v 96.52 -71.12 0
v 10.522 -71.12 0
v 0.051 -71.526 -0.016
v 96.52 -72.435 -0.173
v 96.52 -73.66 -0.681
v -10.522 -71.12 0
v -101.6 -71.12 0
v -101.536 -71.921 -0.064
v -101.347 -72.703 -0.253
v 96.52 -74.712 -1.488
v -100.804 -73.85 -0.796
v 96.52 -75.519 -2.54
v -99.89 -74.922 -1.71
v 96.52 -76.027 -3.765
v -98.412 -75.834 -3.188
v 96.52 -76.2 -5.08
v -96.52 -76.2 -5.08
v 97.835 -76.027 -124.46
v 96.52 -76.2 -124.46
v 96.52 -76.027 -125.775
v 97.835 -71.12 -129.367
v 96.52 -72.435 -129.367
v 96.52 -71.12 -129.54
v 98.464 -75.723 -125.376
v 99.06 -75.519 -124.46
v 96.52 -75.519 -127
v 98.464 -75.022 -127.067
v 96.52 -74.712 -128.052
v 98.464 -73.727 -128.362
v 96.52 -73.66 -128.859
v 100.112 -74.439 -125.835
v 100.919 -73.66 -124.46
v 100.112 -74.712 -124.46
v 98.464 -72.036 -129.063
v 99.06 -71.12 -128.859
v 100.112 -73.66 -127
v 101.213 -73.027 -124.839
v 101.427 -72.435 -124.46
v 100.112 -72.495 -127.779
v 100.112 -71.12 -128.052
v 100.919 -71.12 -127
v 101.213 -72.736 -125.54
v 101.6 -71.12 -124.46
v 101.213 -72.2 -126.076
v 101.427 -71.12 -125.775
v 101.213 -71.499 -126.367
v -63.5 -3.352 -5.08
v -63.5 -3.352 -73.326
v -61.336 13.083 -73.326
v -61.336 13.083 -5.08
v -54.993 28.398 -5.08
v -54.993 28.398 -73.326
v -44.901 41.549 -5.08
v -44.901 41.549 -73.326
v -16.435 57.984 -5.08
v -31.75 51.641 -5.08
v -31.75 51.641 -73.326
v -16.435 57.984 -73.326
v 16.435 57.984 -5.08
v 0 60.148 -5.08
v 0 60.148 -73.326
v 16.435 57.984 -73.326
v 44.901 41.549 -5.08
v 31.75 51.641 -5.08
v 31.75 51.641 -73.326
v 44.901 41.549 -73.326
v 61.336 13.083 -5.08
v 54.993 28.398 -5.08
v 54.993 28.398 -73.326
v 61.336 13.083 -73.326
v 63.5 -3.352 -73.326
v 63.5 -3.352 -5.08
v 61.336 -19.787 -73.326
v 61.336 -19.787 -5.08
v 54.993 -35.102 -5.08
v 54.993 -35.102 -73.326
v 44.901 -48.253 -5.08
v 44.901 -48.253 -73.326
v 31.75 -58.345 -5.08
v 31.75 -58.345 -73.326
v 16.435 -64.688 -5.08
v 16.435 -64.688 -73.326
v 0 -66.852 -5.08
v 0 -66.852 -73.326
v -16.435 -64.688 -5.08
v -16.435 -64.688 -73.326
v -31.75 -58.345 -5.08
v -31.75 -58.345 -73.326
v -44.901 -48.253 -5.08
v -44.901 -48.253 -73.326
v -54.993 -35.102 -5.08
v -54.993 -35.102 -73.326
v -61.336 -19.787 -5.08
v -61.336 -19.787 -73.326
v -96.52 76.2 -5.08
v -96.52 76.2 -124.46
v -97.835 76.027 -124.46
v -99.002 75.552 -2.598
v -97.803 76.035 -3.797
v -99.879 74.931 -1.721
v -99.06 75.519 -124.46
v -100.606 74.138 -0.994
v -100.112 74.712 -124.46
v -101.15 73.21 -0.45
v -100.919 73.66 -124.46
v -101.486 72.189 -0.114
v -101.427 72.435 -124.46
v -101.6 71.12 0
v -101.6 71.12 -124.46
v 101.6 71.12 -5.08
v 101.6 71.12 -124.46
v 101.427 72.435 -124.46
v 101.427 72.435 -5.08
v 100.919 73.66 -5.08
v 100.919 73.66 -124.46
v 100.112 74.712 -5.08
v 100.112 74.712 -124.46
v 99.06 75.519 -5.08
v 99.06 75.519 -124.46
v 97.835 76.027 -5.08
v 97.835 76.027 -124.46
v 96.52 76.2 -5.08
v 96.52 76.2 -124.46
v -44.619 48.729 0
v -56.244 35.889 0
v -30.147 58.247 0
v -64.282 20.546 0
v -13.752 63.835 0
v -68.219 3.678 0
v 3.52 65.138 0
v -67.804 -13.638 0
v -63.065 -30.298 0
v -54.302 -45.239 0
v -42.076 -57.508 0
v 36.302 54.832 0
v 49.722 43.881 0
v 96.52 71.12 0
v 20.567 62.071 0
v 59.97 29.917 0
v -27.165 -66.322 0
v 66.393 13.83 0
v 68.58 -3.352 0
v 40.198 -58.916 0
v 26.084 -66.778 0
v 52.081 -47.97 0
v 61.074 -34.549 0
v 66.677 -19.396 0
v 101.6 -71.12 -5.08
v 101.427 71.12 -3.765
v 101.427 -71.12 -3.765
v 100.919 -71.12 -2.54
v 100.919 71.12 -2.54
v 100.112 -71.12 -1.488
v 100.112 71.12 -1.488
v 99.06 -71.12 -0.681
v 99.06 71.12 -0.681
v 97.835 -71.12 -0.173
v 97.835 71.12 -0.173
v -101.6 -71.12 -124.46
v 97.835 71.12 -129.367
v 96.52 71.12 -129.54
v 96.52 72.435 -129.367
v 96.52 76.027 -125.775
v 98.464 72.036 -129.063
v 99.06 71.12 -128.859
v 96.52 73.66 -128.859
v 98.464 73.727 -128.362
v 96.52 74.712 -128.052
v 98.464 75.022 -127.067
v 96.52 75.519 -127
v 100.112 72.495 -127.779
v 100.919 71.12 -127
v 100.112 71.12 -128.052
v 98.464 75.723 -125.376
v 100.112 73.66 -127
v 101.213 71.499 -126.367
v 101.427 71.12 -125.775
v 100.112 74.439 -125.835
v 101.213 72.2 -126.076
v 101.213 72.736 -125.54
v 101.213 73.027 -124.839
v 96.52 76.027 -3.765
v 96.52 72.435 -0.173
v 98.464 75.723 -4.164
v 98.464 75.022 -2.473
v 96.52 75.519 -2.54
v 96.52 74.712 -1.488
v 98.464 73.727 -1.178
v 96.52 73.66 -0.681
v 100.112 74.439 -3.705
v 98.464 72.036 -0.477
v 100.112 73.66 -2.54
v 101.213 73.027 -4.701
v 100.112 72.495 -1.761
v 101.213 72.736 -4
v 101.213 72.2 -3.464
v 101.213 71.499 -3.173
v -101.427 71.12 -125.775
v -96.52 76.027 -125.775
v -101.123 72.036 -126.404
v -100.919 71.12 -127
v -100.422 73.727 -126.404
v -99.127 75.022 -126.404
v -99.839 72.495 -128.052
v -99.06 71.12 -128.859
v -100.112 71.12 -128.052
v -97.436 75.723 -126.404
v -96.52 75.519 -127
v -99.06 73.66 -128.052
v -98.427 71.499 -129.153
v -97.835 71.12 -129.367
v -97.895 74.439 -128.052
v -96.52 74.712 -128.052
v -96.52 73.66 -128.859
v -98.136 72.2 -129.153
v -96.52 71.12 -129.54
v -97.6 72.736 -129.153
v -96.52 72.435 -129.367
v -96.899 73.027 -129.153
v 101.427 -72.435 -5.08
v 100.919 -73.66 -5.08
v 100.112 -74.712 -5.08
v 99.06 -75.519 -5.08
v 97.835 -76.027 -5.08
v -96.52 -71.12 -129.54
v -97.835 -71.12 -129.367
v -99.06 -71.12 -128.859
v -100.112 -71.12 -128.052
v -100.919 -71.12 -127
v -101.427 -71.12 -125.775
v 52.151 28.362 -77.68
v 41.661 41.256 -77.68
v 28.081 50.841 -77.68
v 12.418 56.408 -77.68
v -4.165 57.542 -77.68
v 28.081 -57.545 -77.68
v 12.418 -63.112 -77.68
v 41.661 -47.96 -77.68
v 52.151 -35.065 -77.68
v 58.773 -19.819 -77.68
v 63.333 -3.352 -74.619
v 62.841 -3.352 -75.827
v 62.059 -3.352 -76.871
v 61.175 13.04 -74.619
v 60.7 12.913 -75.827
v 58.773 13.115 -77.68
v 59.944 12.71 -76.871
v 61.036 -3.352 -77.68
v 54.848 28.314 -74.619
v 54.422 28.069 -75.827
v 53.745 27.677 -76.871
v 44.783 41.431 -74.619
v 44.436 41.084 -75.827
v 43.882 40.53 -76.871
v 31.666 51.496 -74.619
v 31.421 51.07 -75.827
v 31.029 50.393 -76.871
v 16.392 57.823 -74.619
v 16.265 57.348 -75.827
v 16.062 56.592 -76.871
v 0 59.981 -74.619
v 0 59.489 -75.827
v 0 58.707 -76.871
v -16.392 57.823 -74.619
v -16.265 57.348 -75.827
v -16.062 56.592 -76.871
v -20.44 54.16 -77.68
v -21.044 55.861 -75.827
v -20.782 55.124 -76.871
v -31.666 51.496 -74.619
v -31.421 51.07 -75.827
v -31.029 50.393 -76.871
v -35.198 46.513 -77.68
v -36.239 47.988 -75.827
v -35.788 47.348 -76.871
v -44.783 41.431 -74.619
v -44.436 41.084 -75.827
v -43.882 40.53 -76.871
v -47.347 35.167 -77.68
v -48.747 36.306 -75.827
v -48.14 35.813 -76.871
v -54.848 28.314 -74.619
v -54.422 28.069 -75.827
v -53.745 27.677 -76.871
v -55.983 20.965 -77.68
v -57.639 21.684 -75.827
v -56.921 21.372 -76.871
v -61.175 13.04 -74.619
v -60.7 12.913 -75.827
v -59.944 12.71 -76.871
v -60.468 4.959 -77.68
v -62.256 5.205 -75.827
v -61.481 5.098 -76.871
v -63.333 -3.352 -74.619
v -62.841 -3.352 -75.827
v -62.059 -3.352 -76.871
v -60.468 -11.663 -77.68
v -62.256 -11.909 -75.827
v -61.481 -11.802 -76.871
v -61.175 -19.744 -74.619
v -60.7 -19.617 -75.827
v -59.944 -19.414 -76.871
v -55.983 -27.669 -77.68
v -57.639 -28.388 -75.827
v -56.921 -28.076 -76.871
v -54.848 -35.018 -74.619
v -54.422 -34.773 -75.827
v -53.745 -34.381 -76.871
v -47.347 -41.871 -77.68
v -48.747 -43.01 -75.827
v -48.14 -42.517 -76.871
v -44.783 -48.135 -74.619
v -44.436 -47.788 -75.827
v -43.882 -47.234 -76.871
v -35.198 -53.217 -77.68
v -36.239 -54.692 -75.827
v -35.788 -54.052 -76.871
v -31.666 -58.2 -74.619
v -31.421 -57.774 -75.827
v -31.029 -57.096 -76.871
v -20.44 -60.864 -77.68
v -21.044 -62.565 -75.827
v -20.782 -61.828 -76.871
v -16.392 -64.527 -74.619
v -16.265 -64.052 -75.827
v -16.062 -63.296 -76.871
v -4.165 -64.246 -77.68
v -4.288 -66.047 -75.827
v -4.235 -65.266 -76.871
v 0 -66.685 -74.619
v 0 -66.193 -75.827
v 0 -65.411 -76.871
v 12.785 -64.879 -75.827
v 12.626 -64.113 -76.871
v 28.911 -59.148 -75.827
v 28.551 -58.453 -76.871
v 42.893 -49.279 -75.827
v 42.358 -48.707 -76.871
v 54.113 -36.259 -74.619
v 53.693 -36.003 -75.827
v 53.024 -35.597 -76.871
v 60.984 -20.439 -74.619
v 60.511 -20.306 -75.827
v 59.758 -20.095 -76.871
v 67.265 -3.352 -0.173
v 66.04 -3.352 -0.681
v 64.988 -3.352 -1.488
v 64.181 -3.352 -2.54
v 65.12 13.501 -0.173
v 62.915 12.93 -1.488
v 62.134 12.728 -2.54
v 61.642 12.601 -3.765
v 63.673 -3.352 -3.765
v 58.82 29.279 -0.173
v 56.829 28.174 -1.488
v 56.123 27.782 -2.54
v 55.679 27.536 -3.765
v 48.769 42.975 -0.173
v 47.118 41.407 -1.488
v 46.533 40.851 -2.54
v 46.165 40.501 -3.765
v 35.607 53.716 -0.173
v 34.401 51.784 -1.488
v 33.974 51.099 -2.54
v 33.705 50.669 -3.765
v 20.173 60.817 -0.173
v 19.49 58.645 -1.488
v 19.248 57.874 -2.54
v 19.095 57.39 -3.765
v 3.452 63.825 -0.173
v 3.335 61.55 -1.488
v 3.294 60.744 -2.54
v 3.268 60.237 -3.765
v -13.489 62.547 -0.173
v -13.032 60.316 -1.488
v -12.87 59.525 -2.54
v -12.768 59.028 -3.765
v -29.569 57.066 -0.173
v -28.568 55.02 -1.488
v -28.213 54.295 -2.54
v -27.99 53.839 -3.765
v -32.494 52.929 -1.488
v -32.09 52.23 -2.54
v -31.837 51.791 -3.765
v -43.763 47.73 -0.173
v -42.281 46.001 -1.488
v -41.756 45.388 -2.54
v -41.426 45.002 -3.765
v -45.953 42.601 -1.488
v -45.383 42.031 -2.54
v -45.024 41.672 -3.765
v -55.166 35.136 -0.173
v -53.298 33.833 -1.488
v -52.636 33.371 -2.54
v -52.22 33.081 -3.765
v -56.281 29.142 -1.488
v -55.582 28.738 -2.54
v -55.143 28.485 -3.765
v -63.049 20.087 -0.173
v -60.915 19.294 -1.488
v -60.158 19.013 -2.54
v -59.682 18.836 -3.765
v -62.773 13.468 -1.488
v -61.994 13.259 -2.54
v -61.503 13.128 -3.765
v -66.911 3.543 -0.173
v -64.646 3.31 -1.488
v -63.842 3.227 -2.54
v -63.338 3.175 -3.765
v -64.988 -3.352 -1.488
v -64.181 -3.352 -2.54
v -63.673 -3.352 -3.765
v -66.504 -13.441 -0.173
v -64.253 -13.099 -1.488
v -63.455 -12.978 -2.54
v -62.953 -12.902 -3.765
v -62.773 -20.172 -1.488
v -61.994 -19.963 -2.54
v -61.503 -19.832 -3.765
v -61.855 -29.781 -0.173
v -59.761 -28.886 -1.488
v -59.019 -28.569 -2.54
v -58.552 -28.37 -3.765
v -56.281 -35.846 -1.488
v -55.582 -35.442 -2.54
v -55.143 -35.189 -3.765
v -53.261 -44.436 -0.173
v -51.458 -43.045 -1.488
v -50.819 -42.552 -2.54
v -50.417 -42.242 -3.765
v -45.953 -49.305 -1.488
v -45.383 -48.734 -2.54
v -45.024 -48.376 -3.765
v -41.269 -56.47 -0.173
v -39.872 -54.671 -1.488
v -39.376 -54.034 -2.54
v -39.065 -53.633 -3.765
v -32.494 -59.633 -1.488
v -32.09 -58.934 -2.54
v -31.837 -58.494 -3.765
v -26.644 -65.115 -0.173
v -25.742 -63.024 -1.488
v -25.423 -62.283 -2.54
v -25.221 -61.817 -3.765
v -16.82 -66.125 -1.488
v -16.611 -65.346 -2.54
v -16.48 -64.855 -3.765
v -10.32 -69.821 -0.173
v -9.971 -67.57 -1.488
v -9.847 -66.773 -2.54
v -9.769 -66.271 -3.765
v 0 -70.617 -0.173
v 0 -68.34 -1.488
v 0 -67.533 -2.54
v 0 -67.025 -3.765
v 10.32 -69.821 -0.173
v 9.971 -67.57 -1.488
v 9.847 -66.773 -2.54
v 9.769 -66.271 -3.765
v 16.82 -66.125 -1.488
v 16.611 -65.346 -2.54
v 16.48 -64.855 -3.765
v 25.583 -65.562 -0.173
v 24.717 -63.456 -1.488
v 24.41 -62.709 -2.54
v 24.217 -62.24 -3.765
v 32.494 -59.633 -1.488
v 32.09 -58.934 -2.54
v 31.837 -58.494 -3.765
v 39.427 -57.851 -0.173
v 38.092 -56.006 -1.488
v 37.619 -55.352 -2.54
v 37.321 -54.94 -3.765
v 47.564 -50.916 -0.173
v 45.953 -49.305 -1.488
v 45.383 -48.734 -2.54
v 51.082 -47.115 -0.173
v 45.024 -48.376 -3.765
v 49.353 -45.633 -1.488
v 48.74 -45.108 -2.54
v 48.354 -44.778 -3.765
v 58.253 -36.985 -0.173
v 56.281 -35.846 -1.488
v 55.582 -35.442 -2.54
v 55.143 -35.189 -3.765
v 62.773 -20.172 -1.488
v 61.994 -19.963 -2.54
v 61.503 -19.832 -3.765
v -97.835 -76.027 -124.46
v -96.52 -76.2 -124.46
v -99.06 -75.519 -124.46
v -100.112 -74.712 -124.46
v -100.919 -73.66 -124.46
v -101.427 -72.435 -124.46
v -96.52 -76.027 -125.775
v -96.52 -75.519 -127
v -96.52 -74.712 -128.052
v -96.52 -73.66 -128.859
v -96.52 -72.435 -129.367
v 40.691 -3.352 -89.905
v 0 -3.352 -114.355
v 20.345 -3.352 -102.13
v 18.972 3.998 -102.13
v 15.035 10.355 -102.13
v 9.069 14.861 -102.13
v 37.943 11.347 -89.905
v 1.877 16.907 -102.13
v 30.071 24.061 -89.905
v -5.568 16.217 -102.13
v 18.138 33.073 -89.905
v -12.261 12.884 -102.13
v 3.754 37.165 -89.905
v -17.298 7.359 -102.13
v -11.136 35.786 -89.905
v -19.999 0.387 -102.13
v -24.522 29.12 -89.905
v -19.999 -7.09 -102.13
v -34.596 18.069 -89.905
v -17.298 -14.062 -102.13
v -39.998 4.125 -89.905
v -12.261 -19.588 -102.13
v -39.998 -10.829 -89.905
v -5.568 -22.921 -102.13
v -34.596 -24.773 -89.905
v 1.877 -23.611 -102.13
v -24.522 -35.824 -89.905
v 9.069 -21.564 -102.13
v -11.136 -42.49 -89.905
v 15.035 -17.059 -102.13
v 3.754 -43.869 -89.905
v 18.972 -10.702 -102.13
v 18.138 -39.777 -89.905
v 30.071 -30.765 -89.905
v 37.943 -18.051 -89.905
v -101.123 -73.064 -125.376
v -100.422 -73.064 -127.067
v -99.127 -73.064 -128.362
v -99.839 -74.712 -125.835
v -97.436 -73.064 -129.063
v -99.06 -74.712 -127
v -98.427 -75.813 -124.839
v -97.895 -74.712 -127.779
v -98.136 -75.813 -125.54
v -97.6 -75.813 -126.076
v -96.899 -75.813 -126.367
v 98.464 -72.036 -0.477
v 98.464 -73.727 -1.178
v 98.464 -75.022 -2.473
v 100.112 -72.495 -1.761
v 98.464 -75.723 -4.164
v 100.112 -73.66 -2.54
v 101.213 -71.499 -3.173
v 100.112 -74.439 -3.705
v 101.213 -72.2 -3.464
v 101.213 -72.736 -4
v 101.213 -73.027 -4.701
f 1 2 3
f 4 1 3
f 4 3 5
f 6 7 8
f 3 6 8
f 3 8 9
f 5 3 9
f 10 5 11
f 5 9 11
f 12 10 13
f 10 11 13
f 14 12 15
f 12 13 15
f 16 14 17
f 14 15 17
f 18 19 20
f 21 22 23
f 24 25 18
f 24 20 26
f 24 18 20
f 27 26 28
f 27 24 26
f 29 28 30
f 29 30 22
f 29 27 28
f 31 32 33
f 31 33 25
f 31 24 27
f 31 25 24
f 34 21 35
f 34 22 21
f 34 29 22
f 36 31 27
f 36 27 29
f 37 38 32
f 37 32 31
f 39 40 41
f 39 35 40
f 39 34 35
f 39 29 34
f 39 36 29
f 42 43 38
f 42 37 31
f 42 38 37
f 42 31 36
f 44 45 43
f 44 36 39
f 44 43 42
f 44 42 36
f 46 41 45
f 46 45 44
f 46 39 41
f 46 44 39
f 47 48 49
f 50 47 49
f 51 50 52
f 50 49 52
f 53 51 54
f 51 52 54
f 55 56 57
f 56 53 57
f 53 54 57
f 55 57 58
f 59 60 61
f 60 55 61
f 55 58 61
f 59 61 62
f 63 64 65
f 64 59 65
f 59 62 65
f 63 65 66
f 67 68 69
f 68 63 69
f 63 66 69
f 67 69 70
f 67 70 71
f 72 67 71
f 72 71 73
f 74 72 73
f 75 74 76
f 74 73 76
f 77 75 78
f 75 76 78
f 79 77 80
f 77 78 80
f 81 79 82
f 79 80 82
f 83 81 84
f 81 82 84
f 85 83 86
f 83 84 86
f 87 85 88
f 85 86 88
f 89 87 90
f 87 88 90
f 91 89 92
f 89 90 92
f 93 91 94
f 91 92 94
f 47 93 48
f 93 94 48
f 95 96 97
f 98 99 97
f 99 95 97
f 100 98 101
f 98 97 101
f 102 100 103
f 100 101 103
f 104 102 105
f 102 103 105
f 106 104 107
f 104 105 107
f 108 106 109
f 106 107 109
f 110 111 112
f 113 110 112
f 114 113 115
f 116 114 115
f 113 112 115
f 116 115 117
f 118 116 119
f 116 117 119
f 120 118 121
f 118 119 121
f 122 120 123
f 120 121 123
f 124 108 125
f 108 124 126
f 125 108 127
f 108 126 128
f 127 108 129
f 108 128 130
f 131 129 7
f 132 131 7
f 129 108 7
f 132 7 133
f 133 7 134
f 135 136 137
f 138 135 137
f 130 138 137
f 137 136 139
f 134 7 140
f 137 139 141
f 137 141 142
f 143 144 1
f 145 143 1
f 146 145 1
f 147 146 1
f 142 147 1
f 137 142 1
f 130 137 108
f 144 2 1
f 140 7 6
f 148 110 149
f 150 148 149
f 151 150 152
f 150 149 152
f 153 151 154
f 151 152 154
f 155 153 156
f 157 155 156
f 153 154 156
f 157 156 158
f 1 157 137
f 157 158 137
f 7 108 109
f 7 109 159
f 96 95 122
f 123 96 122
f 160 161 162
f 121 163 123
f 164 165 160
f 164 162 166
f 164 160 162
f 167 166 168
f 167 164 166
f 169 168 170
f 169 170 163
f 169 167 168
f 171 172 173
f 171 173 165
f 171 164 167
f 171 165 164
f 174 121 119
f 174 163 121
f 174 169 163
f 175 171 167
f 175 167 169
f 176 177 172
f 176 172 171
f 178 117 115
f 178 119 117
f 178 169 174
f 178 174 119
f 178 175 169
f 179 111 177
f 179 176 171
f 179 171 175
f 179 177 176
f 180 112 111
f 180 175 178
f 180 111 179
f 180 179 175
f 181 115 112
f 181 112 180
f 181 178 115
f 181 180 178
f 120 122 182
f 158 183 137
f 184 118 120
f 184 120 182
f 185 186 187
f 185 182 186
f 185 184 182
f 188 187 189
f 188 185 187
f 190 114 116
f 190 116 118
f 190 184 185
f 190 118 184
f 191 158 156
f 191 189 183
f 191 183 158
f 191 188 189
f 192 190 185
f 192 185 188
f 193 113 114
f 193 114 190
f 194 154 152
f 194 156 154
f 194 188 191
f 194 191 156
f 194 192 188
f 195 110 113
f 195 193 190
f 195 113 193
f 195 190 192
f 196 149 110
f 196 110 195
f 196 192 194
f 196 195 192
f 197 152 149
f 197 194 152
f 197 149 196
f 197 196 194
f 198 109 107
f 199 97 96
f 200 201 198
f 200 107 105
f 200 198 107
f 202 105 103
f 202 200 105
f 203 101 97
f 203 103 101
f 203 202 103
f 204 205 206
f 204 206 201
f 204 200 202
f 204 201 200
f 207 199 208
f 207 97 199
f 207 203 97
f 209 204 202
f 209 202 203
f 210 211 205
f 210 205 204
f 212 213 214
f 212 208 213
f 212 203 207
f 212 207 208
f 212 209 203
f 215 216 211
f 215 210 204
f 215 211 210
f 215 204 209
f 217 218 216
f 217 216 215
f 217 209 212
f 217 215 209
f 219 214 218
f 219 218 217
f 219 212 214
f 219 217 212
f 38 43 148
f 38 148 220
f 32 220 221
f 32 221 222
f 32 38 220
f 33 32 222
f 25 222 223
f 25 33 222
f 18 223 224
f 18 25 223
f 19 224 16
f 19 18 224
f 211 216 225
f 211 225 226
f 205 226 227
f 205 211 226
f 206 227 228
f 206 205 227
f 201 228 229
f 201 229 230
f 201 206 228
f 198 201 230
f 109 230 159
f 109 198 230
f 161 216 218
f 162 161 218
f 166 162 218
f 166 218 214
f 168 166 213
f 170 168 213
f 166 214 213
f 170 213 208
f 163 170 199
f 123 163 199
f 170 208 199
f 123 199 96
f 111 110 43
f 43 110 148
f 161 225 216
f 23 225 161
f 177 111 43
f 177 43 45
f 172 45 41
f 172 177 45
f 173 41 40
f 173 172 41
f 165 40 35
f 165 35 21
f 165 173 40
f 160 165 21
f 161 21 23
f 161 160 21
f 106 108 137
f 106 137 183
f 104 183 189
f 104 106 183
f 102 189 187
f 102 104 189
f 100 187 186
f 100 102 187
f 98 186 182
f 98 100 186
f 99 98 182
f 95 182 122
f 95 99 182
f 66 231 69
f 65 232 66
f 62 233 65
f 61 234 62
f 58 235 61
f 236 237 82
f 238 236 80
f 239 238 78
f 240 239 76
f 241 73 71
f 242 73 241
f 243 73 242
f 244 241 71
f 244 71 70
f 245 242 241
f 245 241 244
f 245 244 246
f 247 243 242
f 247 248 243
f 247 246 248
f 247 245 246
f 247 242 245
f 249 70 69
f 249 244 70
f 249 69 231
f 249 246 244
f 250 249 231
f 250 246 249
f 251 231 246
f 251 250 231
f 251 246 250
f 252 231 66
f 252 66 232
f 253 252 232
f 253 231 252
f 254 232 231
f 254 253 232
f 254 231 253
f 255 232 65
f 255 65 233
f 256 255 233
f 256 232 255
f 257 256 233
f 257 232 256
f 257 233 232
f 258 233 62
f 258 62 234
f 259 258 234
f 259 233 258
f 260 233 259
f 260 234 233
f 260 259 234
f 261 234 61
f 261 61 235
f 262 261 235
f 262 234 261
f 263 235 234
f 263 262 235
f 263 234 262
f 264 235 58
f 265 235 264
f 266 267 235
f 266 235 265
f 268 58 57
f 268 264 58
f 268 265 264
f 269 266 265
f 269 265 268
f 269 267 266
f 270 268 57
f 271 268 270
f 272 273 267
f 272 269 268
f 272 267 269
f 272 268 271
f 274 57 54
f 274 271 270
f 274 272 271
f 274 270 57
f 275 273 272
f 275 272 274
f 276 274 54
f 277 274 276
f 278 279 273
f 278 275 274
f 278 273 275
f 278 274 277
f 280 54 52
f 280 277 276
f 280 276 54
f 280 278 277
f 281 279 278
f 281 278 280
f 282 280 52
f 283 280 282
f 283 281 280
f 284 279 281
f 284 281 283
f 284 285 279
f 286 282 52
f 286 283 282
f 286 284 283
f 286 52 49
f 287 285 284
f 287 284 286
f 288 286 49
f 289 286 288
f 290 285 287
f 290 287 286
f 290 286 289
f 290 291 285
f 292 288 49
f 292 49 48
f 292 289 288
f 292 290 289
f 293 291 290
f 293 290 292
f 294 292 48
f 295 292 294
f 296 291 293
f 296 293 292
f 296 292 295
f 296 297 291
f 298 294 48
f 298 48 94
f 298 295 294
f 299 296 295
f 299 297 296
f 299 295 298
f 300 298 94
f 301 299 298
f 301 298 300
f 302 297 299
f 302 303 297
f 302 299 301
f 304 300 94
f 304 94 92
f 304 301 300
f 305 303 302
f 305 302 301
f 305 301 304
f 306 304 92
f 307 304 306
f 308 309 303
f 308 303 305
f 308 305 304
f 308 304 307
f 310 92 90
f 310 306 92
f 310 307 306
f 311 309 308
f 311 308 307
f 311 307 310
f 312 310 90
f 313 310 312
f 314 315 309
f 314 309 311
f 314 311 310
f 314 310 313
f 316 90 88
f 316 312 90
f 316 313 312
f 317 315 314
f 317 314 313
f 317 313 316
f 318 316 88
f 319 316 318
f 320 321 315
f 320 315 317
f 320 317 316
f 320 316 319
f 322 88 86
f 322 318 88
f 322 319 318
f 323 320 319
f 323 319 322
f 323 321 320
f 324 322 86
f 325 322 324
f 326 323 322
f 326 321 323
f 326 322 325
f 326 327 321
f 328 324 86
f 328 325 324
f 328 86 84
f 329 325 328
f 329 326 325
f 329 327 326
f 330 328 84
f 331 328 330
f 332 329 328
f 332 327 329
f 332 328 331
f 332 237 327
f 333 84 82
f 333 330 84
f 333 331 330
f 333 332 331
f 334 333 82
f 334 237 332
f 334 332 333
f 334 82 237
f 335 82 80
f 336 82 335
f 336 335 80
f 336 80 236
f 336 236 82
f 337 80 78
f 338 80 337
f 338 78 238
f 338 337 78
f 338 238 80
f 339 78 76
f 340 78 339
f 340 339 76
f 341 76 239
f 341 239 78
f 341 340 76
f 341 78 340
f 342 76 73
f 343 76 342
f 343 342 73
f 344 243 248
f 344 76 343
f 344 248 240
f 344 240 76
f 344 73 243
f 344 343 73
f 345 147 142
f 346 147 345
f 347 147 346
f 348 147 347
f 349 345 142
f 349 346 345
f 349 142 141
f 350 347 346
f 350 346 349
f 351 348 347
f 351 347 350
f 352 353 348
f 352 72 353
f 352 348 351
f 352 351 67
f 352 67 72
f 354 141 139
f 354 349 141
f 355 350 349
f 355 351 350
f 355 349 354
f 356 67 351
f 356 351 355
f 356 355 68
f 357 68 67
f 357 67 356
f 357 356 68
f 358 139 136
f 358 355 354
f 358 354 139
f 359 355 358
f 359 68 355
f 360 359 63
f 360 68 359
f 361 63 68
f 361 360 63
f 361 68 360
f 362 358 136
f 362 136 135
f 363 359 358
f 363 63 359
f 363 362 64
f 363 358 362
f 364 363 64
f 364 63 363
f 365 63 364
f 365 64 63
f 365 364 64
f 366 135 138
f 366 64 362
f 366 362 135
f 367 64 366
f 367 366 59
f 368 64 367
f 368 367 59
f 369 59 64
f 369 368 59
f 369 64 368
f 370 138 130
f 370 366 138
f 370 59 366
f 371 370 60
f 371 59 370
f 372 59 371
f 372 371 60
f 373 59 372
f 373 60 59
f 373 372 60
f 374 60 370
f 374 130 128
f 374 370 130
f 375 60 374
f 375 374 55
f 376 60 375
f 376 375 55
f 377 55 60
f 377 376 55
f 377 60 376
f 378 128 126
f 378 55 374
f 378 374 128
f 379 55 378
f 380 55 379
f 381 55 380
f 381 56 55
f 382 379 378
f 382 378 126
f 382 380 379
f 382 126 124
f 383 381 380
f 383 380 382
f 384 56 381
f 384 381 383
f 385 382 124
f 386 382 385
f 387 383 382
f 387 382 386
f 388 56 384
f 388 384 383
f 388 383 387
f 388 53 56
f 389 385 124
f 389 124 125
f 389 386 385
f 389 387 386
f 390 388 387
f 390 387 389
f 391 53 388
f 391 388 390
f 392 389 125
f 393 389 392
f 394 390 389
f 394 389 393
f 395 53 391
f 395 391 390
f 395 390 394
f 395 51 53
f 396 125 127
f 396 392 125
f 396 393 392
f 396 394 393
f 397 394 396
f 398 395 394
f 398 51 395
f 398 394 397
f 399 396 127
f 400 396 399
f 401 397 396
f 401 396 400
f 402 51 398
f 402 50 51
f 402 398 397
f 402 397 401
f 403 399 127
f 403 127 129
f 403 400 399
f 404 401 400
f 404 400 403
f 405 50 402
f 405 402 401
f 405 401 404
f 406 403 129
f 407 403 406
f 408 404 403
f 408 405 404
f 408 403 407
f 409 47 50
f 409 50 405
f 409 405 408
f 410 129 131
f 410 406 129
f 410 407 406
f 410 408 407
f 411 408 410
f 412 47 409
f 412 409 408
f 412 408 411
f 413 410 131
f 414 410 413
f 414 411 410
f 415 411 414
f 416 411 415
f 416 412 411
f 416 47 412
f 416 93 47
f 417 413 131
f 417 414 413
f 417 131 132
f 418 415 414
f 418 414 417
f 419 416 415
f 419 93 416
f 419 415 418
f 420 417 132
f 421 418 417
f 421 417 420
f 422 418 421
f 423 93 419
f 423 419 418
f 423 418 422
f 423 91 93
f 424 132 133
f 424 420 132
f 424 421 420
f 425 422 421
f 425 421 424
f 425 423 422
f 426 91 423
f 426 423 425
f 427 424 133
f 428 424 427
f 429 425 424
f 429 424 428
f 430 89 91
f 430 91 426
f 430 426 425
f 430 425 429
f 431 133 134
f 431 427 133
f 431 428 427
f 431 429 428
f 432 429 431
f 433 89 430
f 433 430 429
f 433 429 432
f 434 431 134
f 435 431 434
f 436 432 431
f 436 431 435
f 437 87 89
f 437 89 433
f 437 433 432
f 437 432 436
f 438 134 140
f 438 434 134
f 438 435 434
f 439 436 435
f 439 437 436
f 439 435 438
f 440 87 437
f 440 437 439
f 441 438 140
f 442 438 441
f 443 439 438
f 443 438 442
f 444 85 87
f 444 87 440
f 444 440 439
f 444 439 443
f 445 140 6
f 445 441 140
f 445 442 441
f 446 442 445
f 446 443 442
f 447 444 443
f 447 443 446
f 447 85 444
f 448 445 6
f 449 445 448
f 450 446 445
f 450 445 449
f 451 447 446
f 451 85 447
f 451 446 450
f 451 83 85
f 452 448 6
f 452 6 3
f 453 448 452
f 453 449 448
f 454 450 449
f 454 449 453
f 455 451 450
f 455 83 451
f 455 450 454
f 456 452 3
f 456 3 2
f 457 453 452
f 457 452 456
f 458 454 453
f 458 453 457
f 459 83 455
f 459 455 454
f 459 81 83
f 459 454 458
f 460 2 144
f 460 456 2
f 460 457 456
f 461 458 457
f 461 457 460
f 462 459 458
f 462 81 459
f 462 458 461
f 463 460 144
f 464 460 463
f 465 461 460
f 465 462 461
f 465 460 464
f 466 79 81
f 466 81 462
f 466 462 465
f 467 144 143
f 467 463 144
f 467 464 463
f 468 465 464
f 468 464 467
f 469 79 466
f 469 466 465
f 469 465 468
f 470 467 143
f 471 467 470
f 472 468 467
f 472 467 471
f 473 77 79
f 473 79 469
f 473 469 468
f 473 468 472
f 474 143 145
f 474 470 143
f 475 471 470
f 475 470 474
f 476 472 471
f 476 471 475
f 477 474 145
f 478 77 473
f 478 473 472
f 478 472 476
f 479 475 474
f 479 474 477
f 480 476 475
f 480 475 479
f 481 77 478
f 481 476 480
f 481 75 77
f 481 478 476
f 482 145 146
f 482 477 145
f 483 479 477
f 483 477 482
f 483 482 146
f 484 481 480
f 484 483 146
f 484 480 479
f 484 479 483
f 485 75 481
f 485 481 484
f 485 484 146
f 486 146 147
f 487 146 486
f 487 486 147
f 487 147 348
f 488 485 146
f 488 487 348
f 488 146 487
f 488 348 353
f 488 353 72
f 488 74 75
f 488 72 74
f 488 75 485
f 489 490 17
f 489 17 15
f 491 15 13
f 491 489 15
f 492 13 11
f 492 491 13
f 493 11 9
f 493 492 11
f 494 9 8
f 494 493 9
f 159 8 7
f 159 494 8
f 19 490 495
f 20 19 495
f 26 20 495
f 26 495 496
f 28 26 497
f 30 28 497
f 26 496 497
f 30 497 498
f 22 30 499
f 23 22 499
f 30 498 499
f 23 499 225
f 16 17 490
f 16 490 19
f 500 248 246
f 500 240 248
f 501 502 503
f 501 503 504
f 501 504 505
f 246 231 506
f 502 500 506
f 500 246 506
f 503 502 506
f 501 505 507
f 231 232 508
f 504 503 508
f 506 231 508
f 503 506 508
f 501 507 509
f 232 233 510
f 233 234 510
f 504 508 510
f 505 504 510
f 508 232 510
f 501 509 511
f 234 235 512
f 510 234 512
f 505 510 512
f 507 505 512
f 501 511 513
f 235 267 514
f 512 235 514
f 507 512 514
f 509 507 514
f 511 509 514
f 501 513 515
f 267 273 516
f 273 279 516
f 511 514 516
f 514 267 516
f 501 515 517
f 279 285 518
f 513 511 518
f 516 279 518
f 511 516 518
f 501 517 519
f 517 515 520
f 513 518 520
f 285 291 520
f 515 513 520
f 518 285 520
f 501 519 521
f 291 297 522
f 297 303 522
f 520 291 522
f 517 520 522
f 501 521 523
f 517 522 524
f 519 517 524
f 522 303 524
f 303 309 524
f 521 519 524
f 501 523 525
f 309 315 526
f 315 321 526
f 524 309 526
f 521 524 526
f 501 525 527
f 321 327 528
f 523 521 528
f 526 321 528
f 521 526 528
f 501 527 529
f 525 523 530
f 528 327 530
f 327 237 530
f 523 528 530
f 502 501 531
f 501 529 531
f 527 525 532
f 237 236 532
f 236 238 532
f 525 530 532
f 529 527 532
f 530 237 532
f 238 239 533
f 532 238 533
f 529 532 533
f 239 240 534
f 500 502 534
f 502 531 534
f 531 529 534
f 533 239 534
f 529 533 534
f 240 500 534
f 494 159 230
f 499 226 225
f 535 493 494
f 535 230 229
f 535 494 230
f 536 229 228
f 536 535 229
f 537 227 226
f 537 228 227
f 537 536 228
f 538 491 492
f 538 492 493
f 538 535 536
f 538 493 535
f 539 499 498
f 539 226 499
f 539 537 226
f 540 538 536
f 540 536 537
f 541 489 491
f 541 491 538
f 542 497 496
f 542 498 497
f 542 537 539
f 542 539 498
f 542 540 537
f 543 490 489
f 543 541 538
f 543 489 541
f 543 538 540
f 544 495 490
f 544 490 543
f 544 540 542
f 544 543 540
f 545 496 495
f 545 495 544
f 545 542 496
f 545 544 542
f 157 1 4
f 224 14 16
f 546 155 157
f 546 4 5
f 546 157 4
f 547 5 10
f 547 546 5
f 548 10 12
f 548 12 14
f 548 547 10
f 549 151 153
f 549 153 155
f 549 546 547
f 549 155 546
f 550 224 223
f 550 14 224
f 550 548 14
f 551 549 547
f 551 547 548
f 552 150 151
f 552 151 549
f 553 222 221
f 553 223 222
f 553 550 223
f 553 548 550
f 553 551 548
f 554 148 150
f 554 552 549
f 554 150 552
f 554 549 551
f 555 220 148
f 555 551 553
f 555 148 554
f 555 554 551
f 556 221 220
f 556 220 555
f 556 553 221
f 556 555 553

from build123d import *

# Parameters (mm, degrees)
F1_W         = 203.2
F1_H         = 127
F2_DEPTH     = 76.2
F3_D         = 127
F3_DEPTH     = 76.2
F3_TIP       = 38.1546493083
F4_DEPTH     = 2.54
F5_T3_DEPTH  = 210.82
F5_T5_DEPTH  = 142.24
F5_T7_DEPTH  = 193.04
F5_T9_DEPTH  = 137.16
F5_T11_DEPTH = 119.38
F5_S15_W     = 5.08
F5_S15_H     = 5.08
F5_T16_DEPTH = 5.08
F5_S21_W     = 5.08
F5_S21_H     = 5.08
F5_T22_DEPTH = 5.08
F5_S27_W     = 5.08
F5_S27_H     = 5.08
F5_T28_DEPTH = 5.08
F5_S33_W     = 5.08
F5_S33_H     = 5.08
F5_T34_DEPTH = 5.08
F5_S39_W     = 5.08
F5_S39_H     = 5.08
F5_T40_DEPTH = 5.08
F5_S45_W     = 5.08
F5_S45_H     = 5.08
F5_T46_DEPTH = 5.08


# Not quite as in the source:
# - a fillet or chamfer that OpenCascade refuses, or shapes differently, is made with other operations: its cross-section is extruded or revolved along the edge and cut away or added


with BuildPart() as f2:
    # F1 (on Front) → F2 (new body, symmetric)
    with BuildSketch(Plane.XZ):
        with Locations((0, -63.5)):
            Rectangle(F1_W, F1_H)
    extrude(amount=F2_DEPTH, both=True)

    # F3
    with Locations(Plane.XY):
        with Locations((0, -3.3519673161)):
            Hole(F3_D / 2, depth=F3_DEPTH)
            with Locations((0, 0, -(F3_DEPTH + F3_TIP / 2))):  # 118° drill point
                Cone(0, F3_D / 2, F3_TIP, mode=Mode.SUBTRACT)

    # F4 (add): a face of the model
    f4_faces = [f2.faces().sort_by_distance(p)[0] for p in [
        (0, 0, -127),
    ]]
    extrude(f4_faces, amount=F4_DEPTH)

    # F5: fillet of radius 5.08 on 13 edges, made by hand

    # F5_s1 → F5_t2 (revolve)
    with BuildSketch(Plane.XZ.offset(3.3519673161)):
        with BuildLine():
            ThreePointArc((63.5, -73.3258742868), (62.8414069354, -75.8273859721), (61.0363934205, -77.6802841744))
            Line((61.0363934205, -77.6802841744), (63.5, -76.2))
            Line((63.5, -76.2), (63.5, -73.3258742868))
        make_face()
    revolve(axis=Axis((0, -3.3519673161, -76.2), (0, 0, 1)))

    # F5_s4 → F5_t3 (cut)
    with BuildSketch(Plane.YZ.offset(-114.3)):
        with BuildLine():
            ThreePointArc((71.12, 0), (74.7121024484, -1.4878975516), (76.2, -5.08))
            Line((76.2, -5.08), (76.2, 0))
            Line((76.2, 0), (71.12, 0))
        make_face()
        with BuildLine():
            ThreePointArc((-71.12, 0), (-74.7121024484, -1.4878975516), (-76.2, -5.08))
            Line((-76.2, -5.08), (-76.2, 0))
            Line((-76.2, 0), (-71.12, 0))
        make_face()
    extrude(amount=F5_T3_DEPTH, mode=Mode.SUBTRACT)

    # F5_s6 → F5_t5 (cut)
    with BuildSketch(Plane.XZ.offset(-71.12)):
        with BuildLine():
            ThreePointArc((101.6, -5.08), (100.1121024484, -1.4878975516), (96.52, 0))
            Line((96.52, 0), (101.6, 0))
            Line((101.6, 0), (101.6, -5.08))
        make_face()
        with BuildLine():
            ThreePointArc((101.6, -124.46), (100.1121024484, -128.0521024484), (96.52, -129.54))
            Line((96.52, -129.54), (101.6, -129.54))
            Line((101.6, -129.54), (101.6, -124.46))
        make_face()
        with BuildLine():
            ThreePointArc((-96.52, -129.54), (-100.1121024484, -128.0521024484), (-101.6, -124.46))
            Line((-101.6, -124.46), (-101.6, -129.54))
            Line((-101.6, -129.54), (-96.52, -129.54))
        make_face()
    extrude(amount=F5_T5_DEPTH, mode=Mode.SUBTRACT)

    # F5_s8 → F5_t7 (cut)
    with BuildSketch(Plane.YZ.offset(-96.52)):
        with BuildLine():
            ThreePointArc((-76.2, -124.46), (-74.7121024484, -128.0521024484), (-71.12, -129.54))
            Line((-71.12, -129.54), (-76.2, -129.54))
            Line((-76.2, -129.54), (-76.2, -124.46))
        make_face()
        with BuildLine():
            ThreePointArc((71.12, -129.54), (74.7121024484, -128.0521024484), (76.2, -124.46))
            Line((76.2, -124.46), (76.2, -129.54))
            Line((76.2, -129.54), (71.12, -129.54))
        make_face()
    extrude(amount=F5_T7_DEPTH, mode=Mode.SUBTRACT)

    # F5_s10 → F5_t9 (cut)
    with BuildSketch(Plane.XY.offset(-124.46)):
        with BuildLine():
            ThreePointArc((-96.52, -76.2), (-100.1121024484, -74.7121024484), (-101.6, -71.12))
            Line((-101.6, -71.12), (-101.6, -76.2))
            Line((-101.6, -76.2), (-96.52, -76.2))
        make_face()
        with BuildLine():
            ThreePointArc((-96.52, 76.2), (-100.1121024484, 74.7121024484), (-101.6, 71.12))
            Line((-101.6, 71.12), (-101.6, 76.2))
            Line((-101.6, 76.2), (-96.52, 76.2))
        make_face()
    extrude(amount=F5_T9_DEPTH, mode=Mode.SUBTRACT)

    # F5_s12 → F5_t11 (cut)
    with BuildSketch(Plane.XY.offset(-124.46)):
        with BuildLine():
            ThreePointArc((101.6, -71.12), (100.1121024484, -74.7121024484), (96.52, -76.2))
            Line((96.52, -76.2), (101.6, -76.2))
            Line((101.6, -76.2), (101.6, -71.12))
        make_face()
        with BuildLine():
            ThreePointArc((101.6, 71.12), (100.1121024484, 74.7121024484), (96.52, 76.2))
            Line((96.52, 76.2), (101.6, 76.2))
            Line((101.6, 76.2), (101.6, 71.12))
        make_face()
    extrude(amount=F5_T11_DEPTH, mode=Mode.SUBTRACT)


with BuildPart() as f5_tool14:
    # F5_s15 → F5_t16 (new body)
    with BuildSketch(Plane.YZ.offset(96.52)):
        with Locations((73.66, -2.54)):
            Rectangle(F5_S15_W, F5_S15_H)
    extrude(amount=F5_T16_DEPTH)

    # F5_s17 → F5_t18 (revolve, cut)
    with BuildSketch(Plane(origin=(96.52, 71.12, -5.08), x_dir=(0, -0.7071067812, -0.7071067812), z_dir=(0, -0.7071067812, 0.7071067812))):
        with BuildLine():
            ThreePointArc((0, -5.08), (5.08, 0), (0, 5.08))
            Line((0, 5.08), (0, -5.08))
        make_face()
    revolve(axis=Axis((96.52, 71.12, -5.08), (1, 0, 0)), mode=Mode.SUBTRACT)


with BuildPart() as f2_1:
    add(f2.part)

    # F5_t13: cut F5_tool14
    add(f5_tool14.part, mode=Mode.SUBTRACT)


with BuildPart() as f5_tool20:
    # F5_s21 → F5_t22 (new body)
    with BuildSketch(Plane.YZ.offset(96.52)):
        with Locations((-73.66, -2.54)):
            Rectangle(F5_S21_W, F5_S21_H)
    extrude(amount=F5_T22_DEPTH)

    # F5_s23 → F5_t24 (revolve, cut)
    with BuildSketch(Plane(origin=(96.52, -71.12, -5.08), x_dir=(0, 0.7071067812, -0.7071067812), z_dir=(0, -0.7071067812, -0.7071067812))):
        with BuildLine():
            ThreePointArc((0, -5.08), (5.08, 0), (0, 5.08))
            Line((0, 5.08), (0, -5.08))
        make_face()
    revolve(axis=Axis((96.52, -71.12, -5.08), (1, 0, 0)), mode=Mode.SUBTRACT)


with BuildPart() as f2_2:
    add(f2_1.part)

    # F5_t19: cut F5_tool20
    add(f5_tool20.part, mode=Mode.SUBTRACT)


with BuildPart() as f5_tool26:
    # F5_s27 → F5_t28 (new body)
    with BuildSketch(Plane.YZ.offset(96.52)):
        with Locations((-73.66, -127)):
            Rectangle(F5_S27_W, F5_S27_H)
    extrude(amount=F5_T28_DEPTH)

    # F5_s29 → F5_t30 (revolve, cut)
    with BuildSketch(Plane(origin=(96.52, -71.12, -124.46), x_dir=(0, 0.7071067812, 0.7071067812), z_dir=(0, 0.7071067812, -0.7071067812))):
        with BuildLine():
            ThreePointArc((0, -5.08), (5.08, 0), (0, 5.08))
            Line((0, 5.08), (0, -5.08))
        make_face()
    revolve(axis=Axis((96.52, -71.12, -124.46), (1, 0, 0)), mode=Mode.SUBTRACT)


with BuildPart() as f2_3:
    add(f2_2.part)

    # F5_t25: cut F5_tool26
    add(f5_tool26.part, mode=Mode.SUBTRACT)


with BuildPart() as f5_tool32:
    # F5_s33 → F5_t34 (new body)
    with BuildSketch(Plane.YZ.offset(96.52)):
        with Locations((73.66, -127)):
            Rectangle(F5_S33_W, F5_S33_H)
    extrude(amount=F5_T34_DEPTH)

    # F5_s35 → F5_t36 (revolve, cut)
    with BuildSketch(Plane(origin=(96.52, 71.12, -124.46), x_dir=(0, -0.7071067812, 0.7071067812), z_dir=(0, 0.7071067812, 0.7071067812))):
        with BuildLine():
            ThreePointArc((0, -5.08), (5.08, 0), (0, 5.08))
            Line((0, 5.08), (0, -5.08))
        make_face()
    revolve(axis=Axis((96.52, 71.12, -124.46), (1, 0, 0)), mode=Mode.SUBTRACT)


with BuildPart() as f2_4:
    add(f2_3.part)

    # F5_t31: cut F5_tool32
    add(f5_tool32.part, mode=Mode.SUBTRACT)


with BuildPart() as f5_tool38:
    # F5_s39 → F5_t40 (new body)
    with BuildSketch(Plane.XZ.offset(71.12)):
        with Locations((-99.06, -127)):
            Rectangle(F5_S39_W, F5_S39_H)
    extrude(amount=F5_T40_DEPTH)

    # F5_s41 → F5_t42 (revolve, cut)
    with BuildSketch(Plane(origin=(-96.52, -71.12, -124.46), x_dir=(0.7071067812, 0, 0.7071067812), z_dir=(0.7071067812, 0, -0.7071067812))):
        with BuildLine():
            ThreePointArc((0, -5.08), (5.08, 0), (0, 5.08))
            Line((0, 5.08), (0, -5.08))
        make_face()
    revolve(axis=Axis((-96.52, -71.12, -124.46), (0, -1, 0)), mode=Mode.SUBTRACT)


with BuildPart() as f2_5:
    add(f2_4.part)

    # F5_t37: cut F5_tool38
    add(f5_tool38.part, mode=Mode.SUBTRACT)


with BuildPart() as f5_tool44:
    # F5_s45 → F5_t46 (new body)
    with BuildSketch(Plane.XY.offset(-124.46)):
        with Locations((-99.06, 73.66)):
            Rectangle(F5_S45_W, F5_S45_H)
    extrude(amount=-F5_T46_DEPTH)

    # F5_s47 → F5_t48 (revolve, cut)
    with BuildSketch(Plane(origin=(-96.52, 71.12, -124.46), x_dir=(0.7071067812, -0.7071067812, 0), z_dir=(0.7071067812, 0.7071067812, 0))):
        with BuildLine():
            ThreePointArc((0, -5.08), (5.08, 0), (0, 5.08))
            Line((0, 5.08), (0, -5.08))
        make_face()
    revolve(axis=Axis((-96.52, 71.12, -124.46), (0, 0, -1)), mode=Mode.SUBTRACT)


with BuildPart() as f2_6:
    add(f2_5.part)

    # F5_t43: cut F5_tool44
    add(f5_tool44.part, mode=Mode.SUBTRACT)

    # F5_s49 → F5_t50 (revolve, cut)
    with BuildSketch(Plane.XZ.offset(3.3519673161)):
        with BuildLine():
            ThreePointArc((68.58, 0), (64.9878975516, -1.4878975516), (63.5, -5.08))
            Line((63.5, -5.08), (63.5, 0))
            Line((63.5, 0), (68.58, 0))
        make_face()
    revolve(axis=Axis((0, -3.3519673161, 0), (0, 0, 1)), mode=Mode.SUBTRACT)


solid = f2_6.part
